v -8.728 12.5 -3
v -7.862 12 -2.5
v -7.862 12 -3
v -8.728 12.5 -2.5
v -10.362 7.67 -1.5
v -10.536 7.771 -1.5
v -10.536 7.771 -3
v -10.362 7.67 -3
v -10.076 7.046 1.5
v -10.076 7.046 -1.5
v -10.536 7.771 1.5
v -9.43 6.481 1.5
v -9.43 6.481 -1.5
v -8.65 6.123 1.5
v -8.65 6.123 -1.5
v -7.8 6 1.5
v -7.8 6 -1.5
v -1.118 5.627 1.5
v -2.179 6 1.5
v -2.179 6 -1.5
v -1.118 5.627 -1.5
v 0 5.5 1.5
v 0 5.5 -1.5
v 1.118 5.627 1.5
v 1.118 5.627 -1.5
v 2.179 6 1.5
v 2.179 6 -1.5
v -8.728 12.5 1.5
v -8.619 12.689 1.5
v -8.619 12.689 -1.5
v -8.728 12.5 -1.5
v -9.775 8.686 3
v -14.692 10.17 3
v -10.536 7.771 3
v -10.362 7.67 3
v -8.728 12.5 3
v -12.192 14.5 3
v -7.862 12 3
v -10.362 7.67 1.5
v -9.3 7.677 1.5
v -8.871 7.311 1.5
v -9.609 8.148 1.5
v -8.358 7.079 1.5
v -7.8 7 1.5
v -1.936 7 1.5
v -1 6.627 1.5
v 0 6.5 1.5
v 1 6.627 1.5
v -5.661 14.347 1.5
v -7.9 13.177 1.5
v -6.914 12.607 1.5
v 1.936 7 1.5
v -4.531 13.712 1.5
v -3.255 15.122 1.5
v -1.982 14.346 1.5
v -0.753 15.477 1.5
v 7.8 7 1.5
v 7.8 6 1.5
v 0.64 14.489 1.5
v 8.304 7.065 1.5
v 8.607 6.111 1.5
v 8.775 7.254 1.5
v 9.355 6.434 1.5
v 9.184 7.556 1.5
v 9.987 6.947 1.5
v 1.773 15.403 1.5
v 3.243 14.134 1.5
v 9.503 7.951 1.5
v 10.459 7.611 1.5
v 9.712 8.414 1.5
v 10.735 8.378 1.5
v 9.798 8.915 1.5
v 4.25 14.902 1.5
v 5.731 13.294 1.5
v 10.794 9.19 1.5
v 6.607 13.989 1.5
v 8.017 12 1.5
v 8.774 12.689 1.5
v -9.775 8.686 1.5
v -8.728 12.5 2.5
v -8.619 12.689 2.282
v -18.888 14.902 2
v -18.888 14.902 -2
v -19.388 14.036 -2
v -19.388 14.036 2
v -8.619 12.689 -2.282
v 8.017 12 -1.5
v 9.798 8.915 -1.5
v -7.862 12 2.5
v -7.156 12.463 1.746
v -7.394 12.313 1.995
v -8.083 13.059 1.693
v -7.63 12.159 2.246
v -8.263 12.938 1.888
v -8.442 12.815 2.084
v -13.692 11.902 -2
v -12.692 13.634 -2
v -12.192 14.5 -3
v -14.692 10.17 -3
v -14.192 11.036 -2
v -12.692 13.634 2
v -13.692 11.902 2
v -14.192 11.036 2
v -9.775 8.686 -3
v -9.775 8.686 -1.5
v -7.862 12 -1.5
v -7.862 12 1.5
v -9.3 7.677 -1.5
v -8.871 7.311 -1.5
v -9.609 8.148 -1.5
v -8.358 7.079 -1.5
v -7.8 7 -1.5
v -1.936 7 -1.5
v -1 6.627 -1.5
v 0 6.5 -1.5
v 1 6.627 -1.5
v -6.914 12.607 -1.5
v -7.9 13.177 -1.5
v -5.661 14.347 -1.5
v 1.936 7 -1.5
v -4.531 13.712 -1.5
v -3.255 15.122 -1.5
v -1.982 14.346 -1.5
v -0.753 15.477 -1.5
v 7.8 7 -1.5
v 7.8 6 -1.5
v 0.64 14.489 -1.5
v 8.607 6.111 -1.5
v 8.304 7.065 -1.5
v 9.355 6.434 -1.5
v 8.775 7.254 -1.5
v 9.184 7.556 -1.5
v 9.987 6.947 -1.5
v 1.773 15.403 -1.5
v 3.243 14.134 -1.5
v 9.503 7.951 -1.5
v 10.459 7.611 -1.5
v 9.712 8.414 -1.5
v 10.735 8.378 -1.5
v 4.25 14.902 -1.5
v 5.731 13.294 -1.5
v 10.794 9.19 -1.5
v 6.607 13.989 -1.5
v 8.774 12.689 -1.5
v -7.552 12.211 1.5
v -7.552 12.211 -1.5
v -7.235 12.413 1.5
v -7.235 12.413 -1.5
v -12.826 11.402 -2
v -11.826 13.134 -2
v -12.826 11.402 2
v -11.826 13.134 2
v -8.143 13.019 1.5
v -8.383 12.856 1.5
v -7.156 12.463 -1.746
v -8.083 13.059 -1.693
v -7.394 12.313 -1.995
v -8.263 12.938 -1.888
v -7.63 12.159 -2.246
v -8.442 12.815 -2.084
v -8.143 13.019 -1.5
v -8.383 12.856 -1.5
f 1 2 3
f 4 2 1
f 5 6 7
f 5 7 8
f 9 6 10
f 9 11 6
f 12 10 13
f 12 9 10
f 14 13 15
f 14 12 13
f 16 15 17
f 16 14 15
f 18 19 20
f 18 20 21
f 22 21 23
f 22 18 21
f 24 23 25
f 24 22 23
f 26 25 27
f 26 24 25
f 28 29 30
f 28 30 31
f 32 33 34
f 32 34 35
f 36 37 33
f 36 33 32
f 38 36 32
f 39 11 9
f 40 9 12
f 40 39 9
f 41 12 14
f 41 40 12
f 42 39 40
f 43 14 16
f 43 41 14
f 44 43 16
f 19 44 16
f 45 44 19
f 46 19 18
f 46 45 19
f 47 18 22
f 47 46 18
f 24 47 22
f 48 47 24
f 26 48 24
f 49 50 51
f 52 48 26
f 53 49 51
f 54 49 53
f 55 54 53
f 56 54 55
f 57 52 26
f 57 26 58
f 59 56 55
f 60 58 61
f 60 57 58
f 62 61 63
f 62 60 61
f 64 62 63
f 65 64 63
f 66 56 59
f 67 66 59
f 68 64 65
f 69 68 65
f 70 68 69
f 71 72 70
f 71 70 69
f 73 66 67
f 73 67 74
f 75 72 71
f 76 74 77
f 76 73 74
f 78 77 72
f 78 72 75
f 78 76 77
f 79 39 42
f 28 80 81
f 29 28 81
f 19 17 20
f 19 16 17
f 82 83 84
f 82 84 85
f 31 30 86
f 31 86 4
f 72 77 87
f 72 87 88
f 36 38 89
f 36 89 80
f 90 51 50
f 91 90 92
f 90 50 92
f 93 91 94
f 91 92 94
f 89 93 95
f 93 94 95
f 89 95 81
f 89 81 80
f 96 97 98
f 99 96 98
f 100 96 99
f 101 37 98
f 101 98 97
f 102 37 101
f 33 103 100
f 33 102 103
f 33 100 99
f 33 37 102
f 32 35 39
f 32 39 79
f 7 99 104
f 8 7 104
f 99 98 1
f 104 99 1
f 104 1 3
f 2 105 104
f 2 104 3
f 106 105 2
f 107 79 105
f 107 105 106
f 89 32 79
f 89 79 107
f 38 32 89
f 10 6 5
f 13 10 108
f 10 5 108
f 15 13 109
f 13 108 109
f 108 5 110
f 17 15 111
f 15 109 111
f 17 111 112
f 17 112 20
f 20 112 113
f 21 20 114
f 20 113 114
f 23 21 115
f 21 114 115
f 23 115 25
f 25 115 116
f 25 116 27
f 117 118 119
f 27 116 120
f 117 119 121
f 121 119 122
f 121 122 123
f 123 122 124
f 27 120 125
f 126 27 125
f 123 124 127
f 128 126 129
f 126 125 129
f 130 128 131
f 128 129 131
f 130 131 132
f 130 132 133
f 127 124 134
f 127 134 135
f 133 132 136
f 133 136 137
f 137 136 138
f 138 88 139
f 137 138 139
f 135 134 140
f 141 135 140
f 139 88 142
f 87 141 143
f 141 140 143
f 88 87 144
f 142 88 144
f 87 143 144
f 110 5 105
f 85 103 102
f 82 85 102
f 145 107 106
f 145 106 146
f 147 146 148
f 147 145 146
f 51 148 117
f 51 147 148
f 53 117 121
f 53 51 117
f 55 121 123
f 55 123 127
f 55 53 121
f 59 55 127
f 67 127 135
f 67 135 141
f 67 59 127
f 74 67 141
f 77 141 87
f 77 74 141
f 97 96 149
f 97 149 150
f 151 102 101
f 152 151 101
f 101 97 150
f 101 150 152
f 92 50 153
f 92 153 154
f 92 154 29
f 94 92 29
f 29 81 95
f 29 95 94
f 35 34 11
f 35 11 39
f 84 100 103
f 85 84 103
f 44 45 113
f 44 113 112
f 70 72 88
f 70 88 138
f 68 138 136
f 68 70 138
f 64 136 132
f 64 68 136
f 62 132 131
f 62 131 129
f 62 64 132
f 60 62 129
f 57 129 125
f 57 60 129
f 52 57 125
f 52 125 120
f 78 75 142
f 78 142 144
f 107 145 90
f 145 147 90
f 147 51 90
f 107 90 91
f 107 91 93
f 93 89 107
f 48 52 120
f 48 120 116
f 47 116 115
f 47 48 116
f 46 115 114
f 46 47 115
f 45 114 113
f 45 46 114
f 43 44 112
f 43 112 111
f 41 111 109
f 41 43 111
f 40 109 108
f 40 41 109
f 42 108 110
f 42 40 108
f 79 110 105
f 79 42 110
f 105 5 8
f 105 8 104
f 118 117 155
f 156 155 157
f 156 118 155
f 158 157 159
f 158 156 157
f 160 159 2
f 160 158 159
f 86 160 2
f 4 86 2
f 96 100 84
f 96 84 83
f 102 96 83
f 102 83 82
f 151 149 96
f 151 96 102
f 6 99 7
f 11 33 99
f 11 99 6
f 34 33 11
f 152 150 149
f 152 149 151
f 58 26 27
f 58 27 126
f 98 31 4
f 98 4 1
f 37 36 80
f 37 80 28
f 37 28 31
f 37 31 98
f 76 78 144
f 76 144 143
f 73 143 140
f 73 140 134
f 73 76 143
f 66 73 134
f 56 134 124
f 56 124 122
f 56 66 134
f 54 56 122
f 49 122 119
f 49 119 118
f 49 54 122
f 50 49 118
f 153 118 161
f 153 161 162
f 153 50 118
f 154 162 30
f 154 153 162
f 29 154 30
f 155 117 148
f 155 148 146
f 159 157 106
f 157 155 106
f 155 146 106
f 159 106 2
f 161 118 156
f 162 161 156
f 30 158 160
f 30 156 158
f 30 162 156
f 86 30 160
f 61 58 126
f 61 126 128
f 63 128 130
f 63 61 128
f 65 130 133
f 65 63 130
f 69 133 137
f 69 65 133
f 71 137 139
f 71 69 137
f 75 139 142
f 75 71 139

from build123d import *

# Parameters (mm, degrees)
BOSS_EXTRUDE2_DEPTH = 1.5
BOSS_EXTRUDE3_DEPTH = 3
SKETCH2_W           = 4
SKETCH2_H           = 1
BOSS_EXTRUDE4_DEPTH = 6
SKETCH2_3_W         = 4
SKETCH2_3_H         = 2
CUT_EXTRUDE1_DEPTH  = 1
CHAMFER1_SIZE       = 1


with BuildPart() as part:
    # Sketch1 → Boss-Extrude2 (new, symmetric)
    with BuildSketch(Plane.XY):
        with BuildLine():
            Line((-7.8, 6), (-2.179449472, 6))
            ThreePointArc((-2.179449472, 6), (0, 5.5), (2.179449472, 6))
            Line((2.179449472, 6), (7.8, 6))
            ThreePointArc((7.8, 6), (9.987434844, 6.946922115), (10.793982736, 9.189914132))
            Line((10.793982736, 9.189914132), (8.773900958, 12.688798406))
            ThreePointArc((8.773900958, 12.688798406), (0.077350269, 15.500303533), (-8.61920042, 12.688798406))
            Line((-8.61920042, 12.688798406), (-8.72820323, 12.5))
            Line((-8.72820323, 12.5), (-7.862177826, 12))
            ThreePointArc((-7.862177826, 12), (0.077350269, 14.500303533), (8.016878365, 12))
            Line((8.016878365, 12), (9.798179943, 8.914695163))
            ThreePointArc((9.798179943, 8.914695163), (9.183725104, 7.55594154), (7.8, 7))
            Line((7.8, 7), (1.936491673, 7))
            ThreePointArc((1.936491673, 7), (0, 6.5), (-1.936491673, 7))
            Line((-1.936491673, 7), (-7.8, 7))
            ThreePointArc((-7.8, 7), (-9.098627684, 7.478958864), (-9.775266128, 8.686433862))
            Line((-9.775266128, 8.686433862), (-10.362177826, 7.669872981))
            Line((-10.362177826, 7.669872981), (-10.536485592, 7.770509617))
            ThreePointArc((-10.536485592, 7.770509617), (-9.429651627, 6.481223397), (-7.8, 6))
        make_face()
    extrude(amount=BOSS_EXTRUDE2_DEPTH, both=True)

    # Sketch1<5> → Boss-Extrude3 (add, symmetric)
    with BuildSketch(Plane.XY):
        with BuildLine():
            Line((-14.692304845, 10.169872981), (-10.536485592, 7.770509617))
            ThreePointArc((-10.536485592, 7.770509617), (-10.724033666, 8.329159391), (-10.798758273, 8.913693465))
            Line((-10.798758273, 8.913693465), (-8.72820323, 12.5))
            Line((-8.72820323, 12.5), (-12.192304845, 14.5))
            Line((-12.192304845, 14.5), (-14.692304845, 10.169872981))
        make_face()
        with BuildLine():
            ThreePointArc((-10.798758273, 8.913693465), (-10.724033666, 8.329159391), (-10.536485592, 7.770509617))
            Line((-10.536485592, 7.770509617), (-10.362177826, 7.669872981))
            Line((-10.362177826, 7.669872981), (-9.775266128, 8.686433862))
            Line((-9.775266128, 8.686433862), (-7.862177826, 12))
            Line((-7.862177826, 12), (-8.72820323, 12.5))
            Line((-8.72820323, 12.5), (-10.798758273, 8.913693465))
        make_face()
    extrude(amount=BOSS_EXTRUDE3_DEPTH, both=True)

    # Sketch2 → Boss-Extrude4 (add)
    with BuildSketch(Plane(origin=(-15.422912811, 8.904422863, 0), x_dir=(0, 0, 1), z_dir=(-0.8660254037844408, 0.4999999999999963, 0))):
        with Locations((0, 2.961215932)):
            Rectangle(SKETCH2_W, SKETCH2_H)
    extrude(amount=BOSS_EXTRUDE4_DEPTH)

    # Sketch2<3> → Cut-Extrude1 (cut)
    with BuildSketch(Plane(origin=(-15.422912811, 8.904422863, 0), x_dir=(0, 0, 1), z_dir=(-0.8660254037844408, 0.4999999999999963, 0))):
        with Locations((0, 4.461215932)):
            Rectangle(SKETCH2_3_W, SKETCH2_3_H)
    extrude(amount=-CUT_EXTRUDE1_DEPTH, mode=Mode.SUBTRACT)

    # Chamfer1
    # the kernel refuses this chamfer: 1 mm, written as the material it adds along each edge
    with BuildSketch(Plane(origin=(-8.72820323, 12.5, -1.5), x_dir=(0.4998109584556448, 0.8656979742248824, 0.027495876610586233), z_dir=(0.8660254037844407, -0.4999999999999965, 0))) as chamfer1_piece_1_section:
        Polygon((CHAMFER1_SIZE * 0.999621916911, -CHAMFER1_SIZE * 0.0274958766106), (-CHAMFER1_SIZE * 0.0274958766106, -CHAMFER1_SIZE * 0.999621916911), (0, 0), align=None)
    chamfer1_piece_1 = extrude(amount=1, mode=Mode.PRIVATE)
    chamfer1_piece_1 = chamfer1_piece_1 & Plane(origin=(0.077350269, 0.64446099, -1.842899674), x_dir=(0.5853959924126673, 0.8107475143762012, 0), z_dir=(0, 0, 1)) * Cylinder(14.855842544, 6, mode=Mode.PRIVATE)
    chamfer1_piece_1 = chamfer1_piece_1 - Plane(origin=(0.077350269, 0.64446099, -1.842899674), x_dir=(-0.5730094052913434, 0.8195487913770974, 0), z_dir=(0, 0, 1)) * Cylinder(13.855842544, 6, mode=Mode.PRIVATE)
    add(chamfer1_piece_1)
    with BuildSketch(Plane(origin=(-8.72820323, 12.5, -1.5), x_dir=(0.4998109584556448, 0.8656979742248824, 0.027495876610586233), z_dir=(0.8660254037844407, -0.4999999999999965, 0))) as chamfer1_piece_2_section:
        Polygon((CHAMFER1_SIZE * 0.999621916911, -CHAMFER1_SIZE * 0.0274958766106), (-CHAMFER1_SIZE * 0.0274958766106, -CHAMFER1_SIZE * 0.999621916911), (0, 0), align=None)
    chamfer1_piece_2 = extrude(amount=3.571682988, mode=Mode.PRIVATE)
    chamfer1_piece_2 = split(chamfer1_piece_2, bisect_by=Plane(origin=(-7.598721959, 12.456318948, -1.72489745), z_dir=(0.8660254037844384, -0.5000000000000004, 0)), keep=Keep.TOP, mode=Mode.PRIVATE)
    chamfer1_piece_2 = chamfer1_piece_2 - Plane(origin=(0.077350269, 0.64446099, -1.72489745), x_dir=(-0.5730094052913434, 0.8195487913770974, 0), z_dir=(0, 0, 1)) * Cylinder(13.855842544, 12, mode=Mode.PRIVATE)
    add(chamfer1_piece_2)
    with BuildSketch(Plane(origin=(-8.72820323, 12.5, 1.5), x_dir=(0.4998109584556448, 0.8656979742248824, -0.027495876610586233), z_dir=(0.8660254037844407, -0.4999999999999965, 0))) as chamfer1_piece_3_section:
        Polygon((CHAMFER1_SIZE * 0.999621916911, CHAMFER1_SIZE * 0.0274958766106), (-CHAMFER1_SIZE * 0.0274958766106, CHAMFER1_SIZE * 0.999621916911), (0, 0), align=None)
    chamfer1_piece_3 = extrude(amount=1, mode=Mode.PRIVATE)
    chamfer1_piece_3 = chamfer1_piece_3 & Plane(origin=(0.077350269, 0.64446099, 1.842899674), x_dir=(0.5853959924126673, 0.8107475143762012, 0), z_dir=(0, 0, 1)) * Cylinder(14.855842544, 6, mode=Mode.PRIVATE)
    chamfer1_piece_3 = chamfer1_piece_3 - Plane(origin=(0.077350269, 0.64446099, 1.842899674), x_dir=(-0.5730094052913434, 0.8195487913770974, 0), z_dir=(0, 0, 1)) * Cylinder(13.855842544, 6, mode=Mode.PRIVATE)
    add(chamfer1_piece_3)
    with BuildSketch(Plane(origin=(-8.72820323, 12.5, 1.5), x_dir=(0.4998109584556448, 0.8656979742248824, -0.027495876610586233), z_dir=(0.8660254037844407, -0.4999999999999965, 0))) as chamfer1_piece_4_section:
        Polygon((CHAMFER1_SIZE * 0.999621916911, CHAMFER1_SIZE * 0.0274958766106), (-CHAMFER1_SIZE * 0.0274958766106, CHAMFER1_SIZE * 0.999621916911), (0, 0), align=None)
    chamfer1_piece_4 = extrude(amount=3.571682988, mode=Mode.PRIVATE)
    chamfer1_piece_4 = split(chamfer1_piece_4, bisect_by=Plane(origin=(-7.598721959, 12.456318948, 1.72489745), z_dir=(0.8660254037844384, -0.5000000000000004, 0)), keep=Keep.TOP, mode=Mode.PRIVATE)
    chamfer1_piece_4 = chamfer1_piece_4 - Plane(origin=(0.077350269, 0.64446099, 1.72489745), x_dir=(-0.5730094052913434, 0.8195487913770974, 0), z_dir=(0, 0, 1)) * Cylinder(13.855842544, 12, mode=Mode.PRIVATE)
    add(chamfer1_piece_4)


solid = part.part
